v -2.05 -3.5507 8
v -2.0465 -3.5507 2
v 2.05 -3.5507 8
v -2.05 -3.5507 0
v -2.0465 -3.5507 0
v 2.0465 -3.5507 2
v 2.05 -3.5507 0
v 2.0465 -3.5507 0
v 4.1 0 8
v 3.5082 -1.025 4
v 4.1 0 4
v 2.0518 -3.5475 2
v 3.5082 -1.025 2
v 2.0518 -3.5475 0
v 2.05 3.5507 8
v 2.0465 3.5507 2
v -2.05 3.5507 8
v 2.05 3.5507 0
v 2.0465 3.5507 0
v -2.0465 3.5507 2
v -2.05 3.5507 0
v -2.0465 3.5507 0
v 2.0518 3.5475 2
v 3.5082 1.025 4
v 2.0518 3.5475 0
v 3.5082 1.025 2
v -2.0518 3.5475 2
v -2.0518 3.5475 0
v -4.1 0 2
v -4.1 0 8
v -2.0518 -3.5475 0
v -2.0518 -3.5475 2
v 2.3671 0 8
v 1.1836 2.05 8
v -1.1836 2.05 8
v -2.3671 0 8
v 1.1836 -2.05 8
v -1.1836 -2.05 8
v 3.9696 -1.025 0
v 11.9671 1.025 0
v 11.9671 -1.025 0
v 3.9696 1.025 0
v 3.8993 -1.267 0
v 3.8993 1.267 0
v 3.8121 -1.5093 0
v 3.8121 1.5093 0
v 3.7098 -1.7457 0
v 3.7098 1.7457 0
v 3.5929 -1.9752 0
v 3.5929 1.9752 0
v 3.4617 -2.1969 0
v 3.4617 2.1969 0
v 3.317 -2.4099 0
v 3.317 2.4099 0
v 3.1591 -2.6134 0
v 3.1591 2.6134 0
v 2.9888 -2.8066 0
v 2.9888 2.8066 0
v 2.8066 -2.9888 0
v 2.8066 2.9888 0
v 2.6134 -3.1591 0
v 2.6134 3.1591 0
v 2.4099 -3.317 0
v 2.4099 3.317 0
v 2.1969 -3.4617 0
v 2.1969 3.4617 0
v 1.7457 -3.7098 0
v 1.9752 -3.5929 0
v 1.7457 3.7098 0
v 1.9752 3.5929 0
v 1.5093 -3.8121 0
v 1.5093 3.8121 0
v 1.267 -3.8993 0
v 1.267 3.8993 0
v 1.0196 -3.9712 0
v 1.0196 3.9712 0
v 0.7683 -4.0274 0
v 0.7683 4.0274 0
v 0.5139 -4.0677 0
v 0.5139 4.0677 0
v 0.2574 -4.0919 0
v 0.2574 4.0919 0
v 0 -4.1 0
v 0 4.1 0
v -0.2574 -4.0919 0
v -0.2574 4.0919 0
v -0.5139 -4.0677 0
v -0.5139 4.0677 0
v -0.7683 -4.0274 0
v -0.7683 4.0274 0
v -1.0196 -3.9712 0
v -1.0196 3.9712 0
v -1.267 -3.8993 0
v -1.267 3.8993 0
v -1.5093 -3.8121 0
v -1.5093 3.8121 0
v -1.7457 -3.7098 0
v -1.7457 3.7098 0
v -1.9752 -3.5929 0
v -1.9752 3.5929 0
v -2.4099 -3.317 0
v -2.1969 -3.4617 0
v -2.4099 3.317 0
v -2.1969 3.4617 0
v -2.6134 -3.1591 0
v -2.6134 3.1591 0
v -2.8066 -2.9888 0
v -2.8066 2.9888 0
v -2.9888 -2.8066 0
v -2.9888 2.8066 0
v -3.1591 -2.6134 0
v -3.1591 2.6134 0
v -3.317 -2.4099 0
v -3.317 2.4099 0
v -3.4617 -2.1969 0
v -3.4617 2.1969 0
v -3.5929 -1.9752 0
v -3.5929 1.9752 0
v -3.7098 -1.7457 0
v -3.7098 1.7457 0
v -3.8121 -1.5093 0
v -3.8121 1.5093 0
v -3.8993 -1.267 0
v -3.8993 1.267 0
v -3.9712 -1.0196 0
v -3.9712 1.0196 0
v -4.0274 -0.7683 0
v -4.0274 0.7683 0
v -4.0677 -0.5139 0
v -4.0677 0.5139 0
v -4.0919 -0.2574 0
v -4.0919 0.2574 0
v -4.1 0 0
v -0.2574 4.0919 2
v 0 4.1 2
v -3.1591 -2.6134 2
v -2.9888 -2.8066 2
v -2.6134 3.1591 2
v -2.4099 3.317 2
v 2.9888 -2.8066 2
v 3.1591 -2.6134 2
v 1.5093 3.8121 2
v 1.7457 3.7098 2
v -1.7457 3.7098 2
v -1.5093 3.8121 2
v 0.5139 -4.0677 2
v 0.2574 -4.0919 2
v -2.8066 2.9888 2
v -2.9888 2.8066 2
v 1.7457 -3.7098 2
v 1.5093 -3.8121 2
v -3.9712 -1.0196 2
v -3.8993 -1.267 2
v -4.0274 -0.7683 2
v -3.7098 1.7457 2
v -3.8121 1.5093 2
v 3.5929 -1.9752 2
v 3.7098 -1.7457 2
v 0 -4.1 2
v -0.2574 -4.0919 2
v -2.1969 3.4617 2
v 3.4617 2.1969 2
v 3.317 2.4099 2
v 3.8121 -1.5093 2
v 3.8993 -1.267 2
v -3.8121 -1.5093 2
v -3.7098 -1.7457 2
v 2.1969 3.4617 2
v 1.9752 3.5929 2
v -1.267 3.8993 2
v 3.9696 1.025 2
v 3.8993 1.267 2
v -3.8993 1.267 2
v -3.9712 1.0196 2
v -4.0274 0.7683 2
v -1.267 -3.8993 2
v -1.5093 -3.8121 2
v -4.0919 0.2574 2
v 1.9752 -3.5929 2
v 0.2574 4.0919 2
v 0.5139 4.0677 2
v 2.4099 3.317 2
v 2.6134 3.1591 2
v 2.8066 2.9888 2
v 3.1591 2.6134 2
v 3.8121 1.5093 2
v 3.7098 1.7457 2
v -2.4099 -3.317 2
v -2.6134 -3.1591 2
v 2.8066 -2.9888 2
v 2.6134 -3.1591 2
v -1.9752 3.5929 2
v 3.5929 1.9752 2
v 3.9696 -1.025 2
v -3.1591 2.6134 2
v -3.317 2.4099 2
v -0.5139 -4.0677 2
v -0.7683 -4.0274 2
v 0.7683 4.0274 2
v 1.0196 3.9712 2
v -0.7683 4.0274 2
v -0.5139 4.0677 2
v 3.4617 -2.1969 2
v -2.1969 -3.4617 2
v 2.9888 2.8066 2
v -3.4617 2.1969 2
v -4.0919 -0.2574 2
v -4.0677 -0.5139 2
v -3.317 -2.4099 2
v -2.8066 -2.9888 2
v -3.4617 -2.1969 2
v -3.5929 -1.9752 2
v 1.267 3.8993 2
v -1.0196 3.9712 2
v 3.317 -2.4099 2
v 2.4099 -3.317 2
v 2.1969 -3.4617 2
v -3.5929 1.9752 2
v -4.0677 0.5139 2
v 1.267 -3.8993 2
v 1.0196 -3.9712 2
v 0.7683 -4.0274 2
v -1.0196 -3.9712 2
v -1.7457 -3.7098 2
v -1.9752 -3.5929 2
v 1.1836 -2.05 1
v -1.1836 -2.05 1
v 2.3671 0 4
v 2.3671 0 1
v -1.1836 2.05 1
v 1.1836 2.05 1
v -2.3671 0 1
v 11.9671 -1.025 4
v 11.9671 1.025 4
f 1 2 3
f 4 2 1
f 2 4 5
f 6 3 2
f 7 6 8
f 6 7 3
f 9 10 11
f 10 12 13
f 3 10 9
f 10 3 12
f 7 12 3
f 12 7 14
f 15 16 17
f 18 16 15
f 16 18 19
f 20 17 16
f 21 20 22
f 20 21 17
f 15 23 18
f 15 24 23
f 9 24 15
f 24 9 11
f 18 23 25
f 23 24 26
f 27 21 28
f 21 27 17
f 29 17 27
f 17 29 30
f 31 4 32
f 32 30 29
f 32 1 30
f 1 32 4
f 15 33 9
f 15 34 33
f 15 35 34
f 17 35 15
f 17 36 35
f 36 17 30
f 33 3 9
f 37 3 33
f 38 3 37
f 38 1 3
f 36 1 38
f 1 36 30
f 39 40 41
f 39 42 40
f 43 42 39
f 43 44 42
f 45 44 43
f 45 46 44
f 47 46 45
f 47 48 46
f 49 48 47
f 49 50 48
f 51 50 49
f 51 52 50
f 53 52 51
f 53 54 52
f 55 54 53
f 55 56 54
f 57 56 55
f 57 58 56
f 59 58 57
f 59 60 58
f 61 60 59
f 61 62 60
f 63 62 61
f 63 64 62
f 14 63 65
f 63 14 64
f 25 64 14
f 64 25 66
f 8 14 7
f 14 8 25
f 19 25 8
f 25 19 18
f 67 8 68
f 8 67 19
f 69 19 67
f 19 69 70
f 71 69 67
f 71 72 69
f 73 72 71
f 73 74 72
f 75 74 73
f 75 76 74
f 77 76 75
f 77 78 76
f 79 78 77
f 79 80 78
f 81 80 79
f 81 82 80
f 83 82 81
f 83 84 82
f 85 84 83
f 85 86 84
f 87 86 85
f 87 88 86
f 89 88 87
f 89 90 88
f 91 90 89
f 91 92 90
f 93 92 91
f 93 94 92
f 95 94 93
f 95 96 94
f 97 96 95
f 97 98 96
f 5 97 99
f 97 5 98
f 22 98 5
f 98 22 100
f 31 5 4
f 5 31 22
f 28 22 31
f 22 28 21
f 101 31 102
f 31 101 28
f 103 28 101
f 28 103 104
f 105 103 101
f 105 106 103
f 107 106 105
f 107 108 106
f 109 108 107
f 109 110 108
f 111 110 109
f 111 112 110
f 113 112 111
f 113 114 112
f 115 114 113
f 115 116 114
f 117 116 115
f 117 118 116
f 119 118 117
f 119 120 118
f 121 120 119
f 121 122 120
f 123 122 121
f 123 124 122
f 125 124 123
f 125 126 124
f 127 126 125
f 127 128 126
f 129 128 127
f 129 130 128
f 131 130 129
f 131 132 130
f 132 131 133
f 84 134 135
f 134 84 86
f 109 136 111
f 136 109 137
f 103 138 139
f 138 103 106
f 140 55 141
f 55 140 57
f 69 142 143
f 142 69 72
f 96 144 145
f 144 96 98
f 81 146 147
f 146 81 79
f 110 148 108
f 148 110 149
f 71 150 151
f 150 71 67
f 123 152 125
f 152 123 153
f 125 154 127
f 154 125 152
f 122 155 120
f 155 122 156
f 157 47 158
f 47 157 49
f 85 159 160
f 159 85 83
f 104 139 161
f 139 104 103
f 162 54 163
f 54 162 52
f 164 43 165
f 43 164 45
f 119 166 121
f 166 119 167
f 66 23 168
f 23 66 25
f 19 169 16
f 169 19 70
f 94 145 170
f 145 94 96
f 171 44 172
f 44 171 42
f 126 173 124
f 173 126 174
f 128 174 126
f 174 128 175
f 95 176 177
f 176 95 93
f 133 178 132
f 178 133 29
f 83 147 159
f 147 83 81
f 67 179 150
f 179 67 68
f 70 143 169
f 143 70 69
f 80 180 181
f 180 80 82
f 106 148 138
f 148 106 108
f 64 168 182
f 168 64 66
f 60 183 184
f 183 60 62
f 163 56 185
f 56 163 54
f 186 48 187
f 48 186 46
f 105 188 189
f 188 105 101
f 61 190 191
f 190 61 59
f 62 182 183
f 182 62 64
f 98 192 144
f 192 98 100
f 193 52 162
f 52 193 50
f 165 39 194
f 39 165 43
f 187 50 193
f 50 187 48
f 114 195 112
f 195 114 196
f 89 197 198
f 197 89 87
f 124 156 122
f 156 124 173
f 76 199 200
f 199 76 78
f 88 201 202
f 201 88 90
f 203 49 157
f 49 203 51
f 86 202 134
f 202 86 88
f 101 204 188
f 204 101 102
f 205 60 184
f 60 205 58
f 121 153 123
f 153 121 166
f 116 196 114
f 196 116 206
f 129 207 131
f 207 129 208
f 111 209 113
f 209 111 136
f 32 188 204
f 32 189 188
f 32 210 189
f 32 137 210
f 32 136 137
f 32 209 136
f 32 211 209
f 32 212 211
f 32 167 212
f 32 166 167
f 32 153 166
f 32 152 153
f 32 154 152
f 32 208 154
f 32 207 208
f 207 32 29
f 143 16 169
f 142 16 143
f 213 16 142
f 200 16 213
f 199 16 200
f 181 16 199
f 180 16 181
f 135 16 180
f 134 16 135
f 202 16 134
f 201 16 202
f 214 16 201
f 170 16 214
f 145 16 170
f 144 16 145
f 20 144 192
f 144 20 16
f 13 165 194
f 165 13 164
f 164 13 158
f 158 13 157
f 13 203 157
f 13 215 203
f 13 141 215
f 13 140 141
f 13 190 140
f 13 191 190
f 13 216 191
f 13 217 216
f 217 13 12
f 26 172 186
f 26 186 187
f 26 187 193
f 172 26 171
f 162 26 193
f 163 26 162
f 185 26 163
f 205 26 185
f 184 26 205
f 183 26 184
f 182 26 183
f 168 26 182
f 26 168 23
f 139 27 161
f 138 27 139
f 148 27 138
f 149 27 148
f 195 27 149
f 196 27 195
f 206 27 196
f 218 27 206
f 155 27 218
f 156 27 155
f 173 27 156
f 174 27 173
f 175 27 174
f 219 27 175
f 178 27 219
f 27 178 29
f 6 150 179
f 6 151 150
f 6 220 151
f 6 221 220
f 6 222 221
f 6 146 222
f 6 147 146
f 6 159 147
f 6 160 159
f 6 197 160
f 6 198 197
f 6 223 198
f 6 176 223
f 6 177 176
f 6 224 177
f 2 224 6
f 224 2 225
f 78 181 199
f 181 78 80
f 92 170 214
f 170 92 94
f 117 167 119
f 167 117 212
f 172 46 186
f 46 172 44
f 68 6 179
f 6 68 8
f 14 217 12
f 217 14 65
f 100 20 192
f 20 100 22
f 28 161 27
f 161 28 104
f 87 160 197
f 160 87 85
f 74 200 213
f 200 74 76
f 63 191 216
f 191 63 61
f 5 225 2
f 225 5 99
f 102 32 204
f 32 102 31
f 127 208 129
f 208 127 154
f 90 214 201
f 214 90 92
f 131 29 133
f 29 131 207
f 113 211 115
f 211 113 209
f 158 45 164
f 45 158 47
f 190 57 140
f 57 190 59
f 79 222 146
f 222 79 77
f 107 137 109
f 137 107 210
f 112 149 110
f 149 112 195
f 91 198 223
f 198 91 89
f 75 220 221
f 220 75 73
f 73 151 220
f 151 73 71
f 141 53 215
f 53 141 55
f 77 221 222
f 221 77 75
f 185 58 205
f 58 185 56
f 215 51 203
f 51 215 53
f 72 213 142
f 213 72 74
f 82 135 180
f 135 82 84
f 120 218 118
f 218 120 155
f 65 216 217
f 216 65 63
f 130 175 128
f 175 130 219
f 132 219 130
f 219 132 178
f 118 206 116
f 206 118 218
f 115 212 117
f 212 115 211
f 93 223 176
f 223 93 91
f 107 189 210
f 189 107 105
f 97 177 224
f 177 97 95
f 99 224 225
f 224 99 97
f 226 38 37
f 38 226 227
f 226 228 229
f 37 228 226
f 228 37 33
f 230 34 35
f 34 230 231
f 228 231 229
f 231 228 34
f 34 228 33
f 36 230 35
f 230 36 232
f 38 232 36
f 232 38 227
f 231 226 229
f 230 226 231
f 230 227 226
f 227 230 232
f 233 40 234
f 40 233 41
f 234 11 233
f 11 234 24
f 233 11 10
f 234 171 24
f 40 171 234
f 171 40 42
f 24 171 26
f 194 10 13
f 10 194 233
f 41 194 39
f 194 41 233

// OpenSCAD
spacing = .1;
d = 4 + spacing;
h = 8;
L = 1.2*h;

difference(){
    union(){
        cylinder(r = d, h = h, $fn = 6);
        cylinder(r = d, h = h/4, $fn = 100);
    }
    translate([0,0,1]) cylinder(r = d/sqrt(3), h = h, $fn = 6);
}

echo(d/sqrt(3));
translate([d/sqrt(3), -d/4, 0]) cube([L, d/2, h/2]);
